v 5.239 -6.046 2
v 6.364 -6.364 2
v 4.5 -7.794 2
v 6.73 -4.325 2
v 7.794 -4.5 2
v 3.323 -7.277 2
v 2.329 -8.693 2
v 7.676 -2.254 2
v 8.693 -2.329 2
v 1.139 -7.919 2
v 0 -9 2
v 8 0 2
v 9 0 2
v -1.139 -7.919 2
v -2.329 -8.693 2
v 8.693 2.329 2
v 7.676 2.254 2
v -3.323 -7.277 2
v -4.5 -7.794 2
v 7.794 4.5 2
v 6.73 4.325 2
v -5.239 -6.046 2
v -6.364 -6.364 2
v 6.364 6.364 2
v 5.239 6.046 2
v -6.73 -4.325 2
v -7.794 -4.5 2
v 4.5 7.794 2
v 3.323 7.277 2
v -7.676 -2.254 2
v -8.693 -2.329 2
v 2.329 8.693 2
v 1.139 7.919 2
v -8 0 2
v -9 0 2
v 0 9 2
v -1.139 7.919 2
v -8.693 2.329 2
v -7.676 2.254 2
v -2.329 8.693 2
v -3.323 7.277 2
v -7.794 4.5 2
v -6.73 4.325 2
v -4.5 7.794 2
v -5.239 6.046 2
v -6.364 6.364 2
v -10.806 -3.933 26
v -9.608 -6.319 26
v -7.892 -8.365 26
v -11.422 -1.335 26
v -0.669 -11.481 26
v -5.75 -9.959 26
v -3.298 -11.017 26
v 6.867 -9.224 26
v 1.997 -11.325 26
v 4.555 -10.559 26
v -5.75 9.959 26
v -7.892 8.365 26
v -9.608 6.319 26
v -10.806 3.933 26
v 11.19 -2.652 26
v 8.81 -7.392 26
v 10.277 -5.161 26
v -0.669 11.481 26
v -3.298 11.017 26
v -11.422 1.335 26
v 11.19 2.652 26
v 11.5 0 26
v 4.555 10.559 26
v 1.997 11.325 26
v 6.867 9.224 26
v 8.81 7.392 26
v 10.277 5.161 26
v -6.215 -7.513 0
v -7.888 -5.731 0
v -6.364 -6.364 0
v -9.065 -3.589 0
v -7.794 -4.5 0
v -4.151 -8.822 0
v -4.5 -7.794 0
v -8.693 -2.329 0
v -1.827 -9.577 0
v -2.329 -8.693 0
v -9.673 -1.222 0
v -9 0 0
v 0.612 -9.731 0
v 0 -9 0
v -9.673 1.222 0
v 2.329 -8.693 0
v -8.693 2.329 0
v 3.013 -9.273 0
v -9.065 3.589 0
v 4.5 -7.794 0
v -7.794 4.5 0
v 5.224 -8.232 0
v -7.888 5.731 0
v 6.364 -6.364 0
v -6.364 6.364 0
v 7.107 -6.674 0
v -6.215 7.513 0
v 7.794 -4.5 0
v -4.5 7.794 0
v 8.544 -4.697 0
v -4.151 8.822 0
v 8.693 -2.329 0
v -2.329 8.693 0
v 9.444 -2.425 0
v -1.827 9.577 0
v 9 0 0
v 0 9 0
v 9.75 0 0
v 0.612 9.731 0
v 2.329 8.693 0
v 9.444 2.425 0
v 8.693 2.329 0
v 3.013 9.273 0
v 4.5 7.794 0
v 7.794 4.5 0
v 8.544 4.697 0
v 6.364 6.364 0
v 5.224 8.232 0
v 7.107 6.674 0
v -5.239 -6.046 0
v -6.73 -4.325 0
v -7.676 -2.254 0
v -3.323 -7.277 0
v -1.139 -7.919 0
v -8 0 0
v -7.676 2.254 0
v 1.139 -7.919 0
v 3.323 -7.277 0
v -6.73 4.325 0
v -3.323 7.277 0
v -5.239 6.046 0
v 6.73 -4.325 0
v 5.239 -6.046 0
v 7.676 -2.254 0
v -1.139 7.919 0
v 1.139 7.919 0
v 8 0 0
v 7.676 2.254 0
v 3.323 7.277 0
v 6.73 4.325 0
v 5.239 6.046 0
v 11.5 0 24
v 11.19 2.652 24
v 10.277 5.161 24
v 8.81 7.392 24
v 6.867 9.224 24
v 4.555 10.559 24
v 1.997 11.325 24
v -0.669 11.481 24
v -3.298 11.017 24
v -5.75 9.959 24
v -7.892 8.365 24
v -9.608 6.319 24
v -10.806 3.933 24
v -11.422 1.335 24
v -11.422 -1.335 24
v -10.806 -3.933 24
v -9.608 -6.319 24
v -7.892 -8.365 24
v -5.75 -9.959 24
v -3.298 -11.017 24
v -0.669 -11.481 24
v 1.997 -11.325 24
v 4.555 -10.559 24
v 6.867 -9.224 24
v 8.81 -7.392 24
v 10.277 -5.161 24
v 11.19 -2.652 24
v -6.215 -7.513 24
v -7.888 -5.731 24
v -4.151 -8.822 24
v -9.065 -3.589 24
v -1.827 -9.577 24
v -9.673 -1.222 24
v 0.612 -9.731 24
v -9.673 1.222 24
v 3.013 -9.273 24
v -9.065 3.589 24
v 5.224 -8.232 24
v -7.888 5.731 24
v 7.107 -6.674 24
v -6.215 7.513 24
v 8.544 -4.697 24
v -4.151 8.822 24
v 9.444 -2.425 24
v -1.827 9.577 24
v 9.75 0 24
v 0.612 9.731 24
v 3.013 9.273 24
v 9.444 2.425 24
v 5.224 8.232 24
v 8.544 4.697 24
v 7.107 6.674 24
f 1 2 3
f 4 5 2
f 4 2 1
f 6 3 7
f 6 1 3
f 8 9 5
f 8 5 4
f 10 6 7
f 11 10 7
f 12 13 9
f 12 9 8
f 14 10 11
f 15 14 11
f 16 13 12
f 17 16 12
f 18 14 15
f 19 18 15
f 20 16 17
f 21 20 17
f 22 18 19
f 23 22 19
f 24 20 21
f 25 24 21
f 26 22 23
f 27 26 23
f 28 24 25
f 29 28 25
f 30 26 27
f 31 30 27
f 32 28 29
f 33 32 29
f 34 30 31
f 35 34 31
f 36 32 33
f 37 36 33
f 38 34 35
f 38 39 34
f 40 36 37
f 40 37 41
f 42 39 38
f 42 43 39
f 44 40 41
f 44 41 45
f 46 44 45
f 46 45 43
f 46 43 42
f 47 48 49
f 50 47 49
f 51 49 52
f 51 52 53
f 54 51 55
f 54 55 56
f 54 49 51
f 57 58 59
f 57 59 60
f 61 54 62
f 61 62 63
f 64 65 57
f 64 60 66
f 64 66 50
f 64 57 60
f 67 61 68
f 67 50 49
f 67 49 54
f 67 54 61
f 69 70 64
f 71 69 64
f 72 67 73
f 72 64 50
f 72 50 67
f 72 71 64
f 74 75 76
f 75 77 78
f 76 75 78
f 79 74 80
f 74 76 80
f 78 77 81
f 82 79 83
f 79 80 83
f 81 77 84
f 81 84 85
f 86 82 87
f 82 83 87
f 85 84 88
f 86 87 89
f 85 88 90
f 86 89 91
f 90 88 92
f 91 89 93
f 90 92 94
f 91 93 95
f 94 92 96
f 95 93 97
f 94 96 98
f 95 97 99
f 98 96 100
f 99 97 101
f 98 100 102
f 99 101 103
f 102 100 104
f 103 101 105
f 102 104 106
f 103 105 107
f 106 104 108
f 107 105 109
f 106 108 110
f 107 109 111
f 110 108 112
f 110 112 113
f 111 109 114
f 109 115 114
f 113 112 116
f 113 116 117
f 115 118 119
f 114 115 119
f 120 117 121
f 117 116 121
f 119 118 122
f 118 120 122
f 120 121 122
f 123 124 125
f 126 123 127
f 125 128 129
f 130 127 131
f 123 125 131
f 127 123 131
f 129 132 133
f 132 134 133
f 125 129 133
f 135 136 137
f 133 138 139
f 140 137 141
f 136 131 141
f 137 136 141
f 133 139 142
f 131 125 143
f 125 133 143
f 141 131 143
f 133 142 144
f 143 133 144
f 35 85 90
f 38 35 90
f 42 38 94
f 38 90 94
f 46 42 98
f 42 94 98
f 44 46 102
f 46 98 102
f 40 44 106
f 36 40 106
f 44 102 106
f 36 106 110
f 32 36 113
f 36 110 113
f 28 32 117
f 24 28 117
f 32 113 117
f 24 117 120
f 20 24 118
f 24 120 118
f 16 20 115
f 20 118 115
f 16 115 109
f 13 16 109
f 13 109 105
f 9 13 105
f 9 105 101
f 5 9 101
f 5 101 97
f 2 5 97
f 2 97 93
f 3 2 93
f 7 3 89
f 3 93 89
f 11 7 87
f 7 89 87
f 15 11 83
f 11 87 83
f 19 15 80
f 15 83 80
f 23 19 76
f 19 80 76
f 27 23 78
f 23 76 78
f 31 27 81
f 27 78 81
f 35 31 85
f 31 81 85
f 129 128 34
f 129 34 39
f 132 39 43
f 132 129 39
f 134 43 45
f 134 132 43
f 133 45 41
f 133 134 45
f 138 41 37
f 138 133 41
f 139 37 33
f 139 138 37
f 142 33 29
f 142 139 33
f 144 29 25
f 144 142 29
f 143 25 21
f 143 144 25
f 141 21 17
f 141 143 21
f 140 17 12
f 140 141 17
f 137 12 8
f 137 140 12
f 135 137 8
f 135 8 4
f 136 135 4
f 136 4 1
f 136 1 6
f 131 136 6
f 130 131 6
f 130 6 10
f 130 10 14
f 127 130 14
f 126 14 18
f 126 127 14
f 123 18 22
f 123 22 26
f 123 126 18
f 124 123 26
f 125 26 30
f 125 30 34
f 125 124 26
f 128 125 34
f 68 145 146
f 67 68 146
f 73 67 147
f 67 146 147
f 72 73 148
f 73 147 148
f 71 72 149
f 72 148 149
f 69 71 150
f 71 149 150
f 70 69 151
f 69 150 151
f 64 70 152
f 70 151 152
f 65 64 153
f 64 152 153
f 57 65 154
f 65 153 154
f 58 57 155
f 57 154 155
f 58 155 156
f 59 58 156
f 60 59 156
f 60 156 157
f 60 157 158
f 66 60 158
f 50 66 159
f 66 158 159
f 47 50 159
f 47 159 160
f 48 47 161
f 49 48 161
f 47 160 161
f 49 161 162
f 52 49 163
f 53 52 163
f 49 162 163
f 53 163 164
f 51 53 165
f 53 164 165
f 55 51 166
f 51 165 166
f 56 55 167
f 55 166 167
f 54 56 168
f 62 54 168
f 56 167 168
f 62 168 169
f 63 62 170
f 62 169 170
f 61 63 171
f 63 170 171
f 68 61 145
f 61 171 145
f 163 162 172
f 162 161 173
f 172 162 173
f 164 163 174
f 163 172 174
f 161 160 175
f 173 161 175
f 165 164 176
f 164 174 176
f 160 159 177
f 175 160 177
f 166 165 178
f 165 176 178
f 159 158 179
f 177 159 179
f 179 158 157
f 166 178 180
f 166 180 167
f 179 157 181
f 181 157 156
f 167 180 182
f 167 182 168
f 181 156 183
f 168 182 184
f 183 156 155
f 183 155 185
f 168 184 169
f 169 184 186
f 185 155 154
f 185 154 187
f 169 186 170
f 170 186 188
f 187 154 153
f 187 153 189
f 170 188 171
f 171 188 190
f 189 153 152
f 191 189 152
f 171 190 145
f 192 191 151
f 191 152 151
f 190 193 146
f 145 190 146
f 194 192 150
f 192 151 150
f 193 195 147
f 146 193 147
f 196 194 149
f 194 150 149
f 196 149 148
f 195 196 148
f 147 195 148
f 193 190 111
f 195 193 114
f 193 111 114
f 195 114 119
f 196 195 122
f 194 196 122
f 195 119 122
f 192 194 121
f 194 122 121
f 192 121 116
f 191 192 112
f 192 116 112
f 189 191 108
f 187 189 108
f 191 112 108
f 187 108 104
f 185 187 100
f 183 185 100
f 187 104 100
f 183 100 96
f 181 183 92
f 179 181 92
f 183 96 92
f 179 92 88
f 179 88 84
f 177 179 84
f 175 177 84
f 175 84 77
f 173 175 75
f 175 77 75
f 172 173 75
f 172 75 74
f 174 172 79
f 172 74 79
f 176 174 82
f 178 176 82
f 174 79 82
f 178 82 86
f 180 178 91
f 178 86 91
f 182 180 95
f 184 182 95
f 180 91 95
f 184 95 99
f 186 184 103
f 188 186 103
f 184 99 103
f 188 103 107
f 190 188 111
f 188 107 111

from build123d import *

# Parameters (mm, degrees)
SKETCH1_R           = 9.75
BOSS_EXTRUDE1_DEPTH = 24
SKETCH3_R           = 11.5
BOSS_EXTRUDE2_DEPTH = 2
SKETCH4_R           = 9
SKETCH4_R_2         = 8
CUT_EXTRUDE1_DEPTH  = 2


with BuildPart() as part:
    # Sketch1 → Boss-Extrude1 (new body)
    with BuildSketch(Plane.XY):
        Circle(SKETCH1_R)
    extrude(amount=BOSS_EXTRUDE1_DEPTH)

    # Sketch3 → Boss-Extrude2 (add)
    with BuildSketch(Plane.XY.offset(24)):
        Circle(SKETCH3_R)
    extrude(amount=BOSS_EXTRUDE2_DEPTH)

    # Sketch4 → Cut-Extrude1 (cut)
    with BuildSketch(Plane(origin=(0, 0, 0), x_dir=(-1, 0, 0), z_dir=(0, 0, -1))):
        Circle(SKETCH4_R)
        Circle(SKETCH4_R_2, mode=Mode.SUBTRACT)
    extrude(amount=-CUT_EXTRUDE1_DEPTH, mode=Mode.SUBTRACT)


solid = part.part
